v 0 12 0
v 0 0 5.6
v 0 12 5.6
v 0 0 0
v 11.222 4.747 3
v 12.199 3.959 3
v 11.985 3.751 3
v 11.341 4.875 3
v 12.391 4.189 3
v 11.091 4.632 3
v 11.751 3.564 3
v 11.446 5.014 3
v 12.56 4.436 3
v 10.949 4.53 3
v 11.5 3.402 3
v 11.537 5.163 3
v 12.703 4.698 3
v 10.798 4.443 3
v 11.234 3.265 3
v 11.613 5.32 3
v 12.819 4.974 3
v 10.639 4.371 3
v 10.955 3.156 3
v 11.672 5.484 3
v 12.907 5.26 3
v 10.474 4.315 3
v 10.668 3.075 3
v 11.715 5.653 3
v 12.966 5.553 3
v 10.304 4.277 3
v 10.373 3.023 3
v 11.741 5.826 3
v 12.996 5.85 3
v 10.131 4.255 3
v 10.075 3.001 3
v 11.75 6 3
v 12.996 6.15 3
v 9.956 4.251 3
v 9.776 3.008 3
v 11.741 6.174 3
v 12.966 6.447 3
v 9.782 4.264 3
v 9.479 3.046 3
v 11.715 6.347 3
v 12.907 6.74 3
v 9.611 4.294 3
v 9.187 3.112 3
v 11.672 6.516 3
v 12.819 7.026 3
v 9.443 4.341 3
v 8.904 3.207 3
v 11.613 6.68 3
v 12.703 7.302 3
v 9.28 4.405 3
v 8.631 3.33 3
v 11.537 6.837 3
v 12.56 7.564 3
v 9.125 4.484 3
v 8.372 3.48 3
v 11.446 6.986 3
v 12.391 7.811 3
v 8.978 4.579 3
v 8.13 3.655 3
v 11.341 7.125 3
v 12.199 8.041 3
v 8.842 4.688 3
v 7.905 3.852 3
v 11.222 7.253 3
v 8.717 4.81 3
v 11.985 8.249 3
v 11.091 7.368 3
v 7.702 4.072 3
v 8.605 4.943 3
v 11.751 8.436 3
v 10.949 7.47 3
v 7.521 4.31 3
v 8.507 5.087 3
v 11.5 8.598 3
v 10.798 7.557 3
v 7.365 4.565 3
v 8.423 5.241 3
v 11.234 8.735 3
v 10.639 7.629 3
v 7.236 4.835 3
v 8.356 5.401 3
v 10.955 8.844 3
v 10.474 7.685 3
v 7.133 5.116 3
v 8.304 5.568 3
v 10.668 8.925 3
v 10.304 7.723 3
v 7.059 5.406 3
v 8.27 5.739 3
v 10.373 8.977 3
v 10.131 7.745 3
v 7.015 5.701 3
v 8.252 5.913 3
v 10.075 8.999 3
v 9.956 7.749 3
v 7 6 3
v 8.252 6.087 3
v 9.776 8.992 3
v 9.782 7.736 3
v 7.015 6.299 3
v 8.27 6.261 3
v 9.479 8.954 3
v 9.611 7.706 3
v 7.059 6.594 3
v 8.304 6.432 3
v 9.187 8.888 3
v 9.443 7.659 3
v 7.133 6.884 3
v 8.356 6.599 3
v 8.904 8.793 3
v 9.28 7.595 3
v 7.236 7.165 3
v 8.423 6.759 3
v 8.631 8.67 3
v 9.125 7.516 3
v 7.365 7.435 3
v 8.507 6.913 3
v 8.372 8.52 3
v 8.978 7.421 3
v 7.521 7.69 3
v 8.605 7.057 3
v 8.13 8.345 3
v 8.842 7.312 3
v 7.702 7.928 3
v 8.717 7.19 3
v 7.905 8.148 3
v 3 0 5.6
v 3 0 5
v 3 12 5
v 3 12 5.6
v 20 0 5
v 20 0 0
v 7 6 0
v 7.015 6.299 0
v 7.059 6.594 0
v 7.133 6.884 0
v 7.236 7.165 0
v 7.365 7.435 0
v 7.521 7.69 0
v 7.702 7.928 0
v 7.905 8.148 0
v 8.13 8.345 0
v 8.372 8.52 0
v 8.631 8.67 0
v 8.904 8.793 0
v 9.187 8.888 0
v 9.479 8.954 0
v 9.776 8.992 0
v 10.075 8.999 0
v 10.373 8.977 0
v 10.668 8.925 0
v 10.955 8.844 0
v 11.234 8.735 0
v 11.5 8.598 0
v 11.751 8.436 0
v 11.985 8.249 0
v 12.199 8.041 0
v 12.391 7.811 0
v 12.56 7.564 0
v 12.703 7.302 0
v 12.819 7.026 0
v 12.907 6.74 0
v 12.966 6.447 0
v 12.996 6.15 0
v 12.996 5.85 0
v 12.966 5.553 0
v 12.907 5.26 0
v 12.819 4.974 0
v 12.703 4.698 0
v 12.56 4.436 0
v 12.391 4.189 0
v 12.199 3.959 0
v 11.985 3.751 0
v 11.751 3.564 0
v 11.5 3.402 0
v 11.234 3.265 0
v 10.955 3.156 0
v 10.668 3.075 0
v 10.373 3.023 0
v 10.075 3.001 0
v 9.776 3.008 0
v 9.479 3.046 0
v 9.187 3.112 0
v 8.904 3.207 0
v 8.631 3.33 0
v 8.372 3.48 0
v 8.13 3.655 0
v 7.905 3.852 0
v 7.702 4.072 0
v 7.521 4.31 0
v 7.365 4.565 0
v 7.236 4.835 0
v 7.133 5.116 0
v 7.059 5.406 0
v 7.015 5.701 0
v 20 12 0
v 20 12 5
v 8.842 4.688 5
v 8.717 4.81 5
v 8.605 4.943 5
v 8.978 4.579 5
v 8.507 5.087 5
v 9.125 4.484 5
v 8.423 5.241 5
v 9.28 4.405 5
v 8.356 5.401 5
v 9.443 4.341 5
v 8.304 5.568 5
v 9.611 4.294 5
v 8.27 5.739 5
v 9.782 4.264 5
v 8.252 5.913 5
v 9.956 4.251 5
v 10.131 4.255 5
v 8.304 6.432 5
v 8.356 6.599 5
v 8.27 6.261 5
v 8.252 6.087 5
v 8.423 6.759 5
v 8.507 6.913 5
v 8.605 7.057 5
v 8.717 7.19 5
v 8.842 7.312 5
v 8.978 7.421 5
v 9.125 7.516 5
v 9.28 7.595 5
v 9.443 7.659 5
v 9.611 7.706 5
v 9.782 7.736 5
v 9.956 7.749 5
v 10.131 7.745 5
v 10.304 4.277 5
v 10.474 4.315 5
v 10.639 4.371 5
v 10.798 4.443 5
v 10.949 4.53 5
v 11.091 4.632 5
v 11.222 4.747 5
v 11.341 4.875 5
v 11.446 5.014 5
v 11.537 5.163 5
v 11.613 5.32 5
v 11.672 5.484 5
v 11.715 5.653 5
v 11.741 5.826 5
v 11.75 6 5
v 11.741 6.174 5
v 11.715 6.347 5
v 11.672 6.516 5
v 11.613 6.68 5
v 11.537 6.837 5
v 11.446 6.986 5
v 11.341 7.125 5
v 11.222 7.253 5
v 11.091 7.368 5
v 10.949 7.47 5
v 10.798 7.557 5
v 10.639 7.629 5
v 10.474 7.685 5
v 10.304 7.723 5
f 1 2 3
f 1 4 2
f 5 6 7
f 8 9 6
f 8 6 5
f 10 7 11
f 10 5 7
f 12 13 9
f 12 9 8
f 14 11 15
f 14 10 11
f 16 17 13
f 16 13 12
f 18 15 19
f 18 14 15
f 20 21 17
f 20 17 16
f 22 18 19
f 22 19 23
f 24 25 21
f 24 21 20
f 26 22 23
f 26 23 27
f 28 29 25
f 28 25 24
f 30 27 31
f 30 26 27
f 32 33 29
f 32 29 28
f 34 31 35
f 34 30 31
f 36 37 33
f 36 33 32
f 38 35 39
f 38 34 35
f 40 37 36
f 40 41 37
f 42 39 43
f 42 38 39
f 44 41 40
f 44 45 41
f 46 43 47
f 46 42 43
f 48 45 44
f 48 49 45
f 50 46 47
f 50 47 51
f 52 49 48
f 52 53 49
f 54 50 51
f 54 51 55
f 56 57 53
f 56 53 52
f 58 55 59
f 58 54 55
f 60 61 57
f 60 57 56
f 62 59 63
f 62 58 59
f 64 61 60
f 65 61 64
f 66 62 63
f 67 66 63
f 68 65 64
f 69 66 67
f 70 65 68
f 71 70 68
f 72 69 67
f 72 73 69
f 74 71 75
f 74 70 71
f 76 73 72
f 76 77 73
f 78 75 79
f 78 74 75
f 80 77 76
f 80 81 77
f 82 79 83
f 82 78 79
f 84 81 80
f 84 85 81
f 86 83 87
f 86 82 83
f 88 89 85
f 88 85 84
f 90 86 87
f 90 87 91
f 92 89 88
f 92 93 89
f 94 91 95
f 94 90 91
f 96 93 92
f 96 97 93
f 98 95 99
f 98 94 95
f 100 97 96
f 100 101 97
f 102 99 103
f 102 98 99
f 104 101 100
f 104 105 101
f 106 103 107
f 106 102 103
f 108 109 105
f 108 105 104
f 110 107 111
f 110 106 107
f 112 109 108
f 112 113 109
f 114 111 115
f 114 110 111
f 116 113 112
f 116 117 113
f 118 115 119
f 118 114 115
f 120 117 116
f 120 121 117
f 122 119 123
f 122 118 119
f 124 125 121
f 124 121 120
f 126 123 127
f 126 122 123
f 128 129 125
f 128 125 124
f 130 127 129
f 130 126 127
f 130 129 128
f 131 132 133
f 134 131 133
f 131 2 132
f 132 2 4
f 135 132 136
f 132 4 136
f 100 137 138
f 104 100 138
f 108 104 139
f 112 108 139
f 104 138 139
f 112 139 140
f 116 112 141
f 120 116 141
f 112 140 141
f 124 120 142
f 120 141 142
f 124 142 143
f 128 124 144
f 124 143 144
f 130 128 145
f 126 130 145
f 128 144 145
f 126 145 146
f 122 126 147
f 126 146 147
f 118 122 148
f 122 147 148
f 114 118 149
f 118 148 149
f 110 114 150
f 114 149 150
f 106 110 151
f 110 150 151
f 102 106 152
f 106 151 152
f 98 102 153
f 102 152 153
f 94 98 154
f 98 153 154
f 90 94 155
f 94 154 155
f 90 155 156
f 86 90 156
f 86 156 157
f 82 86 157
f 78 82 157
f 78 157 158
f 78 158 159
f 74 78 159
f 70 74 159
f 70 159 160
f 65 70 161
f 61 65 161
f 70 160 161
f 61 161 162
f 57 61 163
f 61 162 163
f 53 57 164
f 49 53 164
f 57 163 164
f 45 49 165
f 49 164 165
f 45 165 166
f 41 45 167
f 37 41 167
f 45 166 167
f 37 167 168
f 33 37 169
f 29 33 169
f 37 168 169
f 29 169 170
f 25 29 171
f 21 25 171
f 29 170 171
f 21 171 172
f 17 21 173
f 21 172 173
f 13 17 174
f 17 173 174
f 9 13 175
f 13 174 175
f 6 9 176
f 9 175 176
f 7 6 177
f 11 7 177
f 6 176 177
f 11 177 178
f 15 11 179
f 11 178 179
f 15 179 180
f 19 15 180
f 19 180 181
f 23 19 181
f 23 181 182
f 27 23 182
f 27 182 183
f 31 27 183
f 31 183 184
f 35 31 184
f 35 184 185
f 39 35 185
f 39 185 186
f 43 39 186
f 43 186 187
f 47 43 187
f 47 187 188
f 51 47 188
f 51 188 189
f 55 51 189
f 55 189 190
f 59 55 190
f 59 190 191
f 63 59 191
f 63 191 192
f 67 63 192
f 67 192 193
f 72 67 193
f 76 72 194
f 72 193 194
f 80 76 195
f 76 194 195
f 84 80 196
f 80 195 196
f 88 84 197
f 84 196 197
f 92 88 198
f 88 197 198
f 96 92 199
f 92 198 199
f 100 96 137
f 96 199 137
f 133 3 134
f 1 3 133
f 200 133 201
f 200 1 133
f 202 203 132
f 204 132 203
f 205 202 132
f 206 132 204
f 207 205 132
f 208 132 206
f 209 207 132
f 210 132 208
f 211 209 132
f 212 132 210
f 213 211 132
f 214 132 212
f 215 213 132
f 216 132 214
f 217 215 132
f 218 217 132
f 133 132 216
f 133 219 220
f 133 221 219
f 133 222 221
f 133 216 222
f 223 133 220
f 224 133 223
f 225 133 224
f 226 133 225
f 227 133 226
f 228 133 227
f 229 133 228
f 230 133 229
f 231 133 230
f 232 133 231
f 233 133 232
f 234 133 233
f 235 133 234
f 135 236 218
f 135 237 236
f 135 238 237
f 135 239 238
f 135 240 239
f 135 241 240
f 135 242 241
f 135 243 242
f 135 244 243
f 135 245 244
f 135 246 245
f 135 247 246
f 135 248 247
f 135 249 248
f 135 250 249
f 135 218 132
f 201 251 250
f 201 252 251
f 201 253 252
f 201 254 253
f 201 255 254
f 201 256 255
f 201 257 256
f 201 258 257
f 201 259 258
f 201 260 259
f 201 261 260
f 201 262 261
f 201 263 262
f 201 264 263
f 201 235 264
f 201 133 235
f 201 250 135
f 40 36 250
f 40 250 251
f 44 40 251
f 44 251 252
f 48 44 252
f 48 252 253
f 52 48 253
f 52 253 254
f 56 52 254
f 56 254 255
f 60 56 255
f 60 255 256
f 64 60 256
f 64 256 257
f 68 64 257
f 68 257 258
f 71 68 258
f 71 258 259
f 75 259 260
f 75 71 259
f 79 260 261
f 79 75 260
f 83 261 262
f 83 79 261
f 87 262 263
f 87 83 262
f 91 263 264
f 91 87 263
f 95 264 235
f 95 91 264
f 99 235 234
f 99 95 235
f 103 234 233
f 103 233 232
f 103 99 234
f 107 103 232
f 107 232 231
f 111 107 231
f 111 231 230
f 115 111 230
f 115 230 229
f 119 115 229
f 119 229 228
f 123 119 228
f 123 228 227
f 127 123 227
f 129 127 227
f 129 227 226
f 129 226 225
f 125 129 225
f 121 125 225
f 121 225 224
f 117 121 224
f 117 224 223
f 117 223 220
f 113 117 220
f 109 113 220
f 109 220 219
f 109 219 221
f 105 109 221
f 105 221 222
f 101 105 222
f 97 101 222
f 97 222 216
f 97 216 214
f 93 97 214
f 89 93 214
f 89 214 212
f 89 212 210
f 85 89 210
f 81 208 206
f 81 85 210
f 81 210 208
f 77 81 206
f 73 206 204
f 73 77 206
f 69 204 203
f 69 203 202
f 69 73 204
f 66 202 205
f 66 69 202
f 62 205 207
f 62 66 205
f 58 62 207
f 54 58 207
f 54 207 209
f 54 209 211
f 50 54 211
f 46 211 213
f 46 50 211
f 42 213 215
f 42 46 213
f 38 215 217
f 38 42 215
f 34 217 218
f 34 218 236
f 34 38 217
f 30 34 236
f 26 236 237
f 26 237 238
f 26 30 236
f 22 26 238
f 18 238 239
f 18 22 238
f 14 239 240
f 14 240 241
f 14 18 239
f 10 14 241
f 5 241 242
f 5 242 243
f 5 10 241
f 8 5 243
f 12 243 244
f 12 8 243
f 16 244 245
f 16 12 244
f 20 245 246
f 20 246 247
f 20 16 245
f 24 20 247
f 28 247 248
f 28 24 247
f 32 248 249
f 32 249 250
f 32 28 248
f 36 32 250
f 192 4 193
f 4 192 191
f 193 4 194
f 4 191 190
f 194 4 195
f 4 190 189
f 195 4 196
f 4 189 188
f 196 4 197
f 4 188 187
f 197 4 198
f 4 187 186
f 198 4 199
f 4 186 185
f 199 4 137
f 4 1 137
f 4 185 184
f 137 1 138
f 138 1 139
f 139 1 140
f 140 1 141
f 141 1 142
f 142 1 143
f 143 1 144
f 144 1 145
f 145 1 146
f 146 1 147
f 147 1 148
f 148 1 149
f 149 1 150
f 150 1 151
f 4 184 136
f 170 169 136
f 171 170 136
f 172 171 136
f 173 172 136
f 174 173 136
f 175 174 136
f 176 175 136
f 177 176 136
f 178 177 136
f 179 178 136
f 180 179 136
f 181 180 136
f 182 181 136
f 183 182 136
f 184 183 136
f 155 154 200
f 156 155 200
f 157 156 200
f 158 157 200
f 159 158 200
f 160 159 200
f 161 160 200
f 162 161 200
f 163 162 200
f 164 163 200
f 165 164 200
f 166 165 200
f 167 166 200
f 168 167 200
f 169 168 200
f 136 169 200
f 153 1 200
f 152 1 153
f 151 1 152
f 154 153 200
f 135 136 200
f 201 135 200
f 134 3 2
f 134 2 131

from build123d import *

# Parameters (mm, degrees)
SKETCH1_W           = 20
SKETCH1_H           = 12
SKETCH1_R           = 1.75
BOSS_EXTRUDE1_DEPTH = 5
SKETCH2_W           = 3
SKETCH2_H           = 12
BOSS_EXTRUDE2_DEPTH = 0.6
SKETCH3_R           = 3
CUT_EXTRUDE1_DEPTH  = 3


with BuildPart() as part:
    # Sketch1 → Boss-Extrude1 (new body)
    with BuildSketch(Plane.XY):
        with Locations((10, 6)):
            Rectangle(SKETCH1_W, SKETCH1_H)
        with Locations((10, 6)):
            Circle(SKETCH1_R, mode=Mode.SUBTRACT)
    extrude(amount=BOSS_EXTRUDE1_DEPTH)

    # Sketch2 → Boss-Extrude2 (add)
    with BuildSketch(Plane.XY.offset(5)):
        with Locations((1.5, 6)):
            Rectangle(SKETCH2_W, SKETCH2_H)
    extrude(amount=BOSS_EXTRUDE2_DEPTH)

    # Sketch3 → Cut-Extrude1 (cut)
    with BuildSketch(Plane(origin=(0, 0, 0), x_dir=(-1, 0, 0), z_dir=(0, 0, -1))):
        with Locations((-10, 6)):
            Circle(SKETCH3_R)
    extrude(amount=-CUT_EXTRUDE1_DEPTH, mode=Mode.SUBTRACT)


solid = part.part
